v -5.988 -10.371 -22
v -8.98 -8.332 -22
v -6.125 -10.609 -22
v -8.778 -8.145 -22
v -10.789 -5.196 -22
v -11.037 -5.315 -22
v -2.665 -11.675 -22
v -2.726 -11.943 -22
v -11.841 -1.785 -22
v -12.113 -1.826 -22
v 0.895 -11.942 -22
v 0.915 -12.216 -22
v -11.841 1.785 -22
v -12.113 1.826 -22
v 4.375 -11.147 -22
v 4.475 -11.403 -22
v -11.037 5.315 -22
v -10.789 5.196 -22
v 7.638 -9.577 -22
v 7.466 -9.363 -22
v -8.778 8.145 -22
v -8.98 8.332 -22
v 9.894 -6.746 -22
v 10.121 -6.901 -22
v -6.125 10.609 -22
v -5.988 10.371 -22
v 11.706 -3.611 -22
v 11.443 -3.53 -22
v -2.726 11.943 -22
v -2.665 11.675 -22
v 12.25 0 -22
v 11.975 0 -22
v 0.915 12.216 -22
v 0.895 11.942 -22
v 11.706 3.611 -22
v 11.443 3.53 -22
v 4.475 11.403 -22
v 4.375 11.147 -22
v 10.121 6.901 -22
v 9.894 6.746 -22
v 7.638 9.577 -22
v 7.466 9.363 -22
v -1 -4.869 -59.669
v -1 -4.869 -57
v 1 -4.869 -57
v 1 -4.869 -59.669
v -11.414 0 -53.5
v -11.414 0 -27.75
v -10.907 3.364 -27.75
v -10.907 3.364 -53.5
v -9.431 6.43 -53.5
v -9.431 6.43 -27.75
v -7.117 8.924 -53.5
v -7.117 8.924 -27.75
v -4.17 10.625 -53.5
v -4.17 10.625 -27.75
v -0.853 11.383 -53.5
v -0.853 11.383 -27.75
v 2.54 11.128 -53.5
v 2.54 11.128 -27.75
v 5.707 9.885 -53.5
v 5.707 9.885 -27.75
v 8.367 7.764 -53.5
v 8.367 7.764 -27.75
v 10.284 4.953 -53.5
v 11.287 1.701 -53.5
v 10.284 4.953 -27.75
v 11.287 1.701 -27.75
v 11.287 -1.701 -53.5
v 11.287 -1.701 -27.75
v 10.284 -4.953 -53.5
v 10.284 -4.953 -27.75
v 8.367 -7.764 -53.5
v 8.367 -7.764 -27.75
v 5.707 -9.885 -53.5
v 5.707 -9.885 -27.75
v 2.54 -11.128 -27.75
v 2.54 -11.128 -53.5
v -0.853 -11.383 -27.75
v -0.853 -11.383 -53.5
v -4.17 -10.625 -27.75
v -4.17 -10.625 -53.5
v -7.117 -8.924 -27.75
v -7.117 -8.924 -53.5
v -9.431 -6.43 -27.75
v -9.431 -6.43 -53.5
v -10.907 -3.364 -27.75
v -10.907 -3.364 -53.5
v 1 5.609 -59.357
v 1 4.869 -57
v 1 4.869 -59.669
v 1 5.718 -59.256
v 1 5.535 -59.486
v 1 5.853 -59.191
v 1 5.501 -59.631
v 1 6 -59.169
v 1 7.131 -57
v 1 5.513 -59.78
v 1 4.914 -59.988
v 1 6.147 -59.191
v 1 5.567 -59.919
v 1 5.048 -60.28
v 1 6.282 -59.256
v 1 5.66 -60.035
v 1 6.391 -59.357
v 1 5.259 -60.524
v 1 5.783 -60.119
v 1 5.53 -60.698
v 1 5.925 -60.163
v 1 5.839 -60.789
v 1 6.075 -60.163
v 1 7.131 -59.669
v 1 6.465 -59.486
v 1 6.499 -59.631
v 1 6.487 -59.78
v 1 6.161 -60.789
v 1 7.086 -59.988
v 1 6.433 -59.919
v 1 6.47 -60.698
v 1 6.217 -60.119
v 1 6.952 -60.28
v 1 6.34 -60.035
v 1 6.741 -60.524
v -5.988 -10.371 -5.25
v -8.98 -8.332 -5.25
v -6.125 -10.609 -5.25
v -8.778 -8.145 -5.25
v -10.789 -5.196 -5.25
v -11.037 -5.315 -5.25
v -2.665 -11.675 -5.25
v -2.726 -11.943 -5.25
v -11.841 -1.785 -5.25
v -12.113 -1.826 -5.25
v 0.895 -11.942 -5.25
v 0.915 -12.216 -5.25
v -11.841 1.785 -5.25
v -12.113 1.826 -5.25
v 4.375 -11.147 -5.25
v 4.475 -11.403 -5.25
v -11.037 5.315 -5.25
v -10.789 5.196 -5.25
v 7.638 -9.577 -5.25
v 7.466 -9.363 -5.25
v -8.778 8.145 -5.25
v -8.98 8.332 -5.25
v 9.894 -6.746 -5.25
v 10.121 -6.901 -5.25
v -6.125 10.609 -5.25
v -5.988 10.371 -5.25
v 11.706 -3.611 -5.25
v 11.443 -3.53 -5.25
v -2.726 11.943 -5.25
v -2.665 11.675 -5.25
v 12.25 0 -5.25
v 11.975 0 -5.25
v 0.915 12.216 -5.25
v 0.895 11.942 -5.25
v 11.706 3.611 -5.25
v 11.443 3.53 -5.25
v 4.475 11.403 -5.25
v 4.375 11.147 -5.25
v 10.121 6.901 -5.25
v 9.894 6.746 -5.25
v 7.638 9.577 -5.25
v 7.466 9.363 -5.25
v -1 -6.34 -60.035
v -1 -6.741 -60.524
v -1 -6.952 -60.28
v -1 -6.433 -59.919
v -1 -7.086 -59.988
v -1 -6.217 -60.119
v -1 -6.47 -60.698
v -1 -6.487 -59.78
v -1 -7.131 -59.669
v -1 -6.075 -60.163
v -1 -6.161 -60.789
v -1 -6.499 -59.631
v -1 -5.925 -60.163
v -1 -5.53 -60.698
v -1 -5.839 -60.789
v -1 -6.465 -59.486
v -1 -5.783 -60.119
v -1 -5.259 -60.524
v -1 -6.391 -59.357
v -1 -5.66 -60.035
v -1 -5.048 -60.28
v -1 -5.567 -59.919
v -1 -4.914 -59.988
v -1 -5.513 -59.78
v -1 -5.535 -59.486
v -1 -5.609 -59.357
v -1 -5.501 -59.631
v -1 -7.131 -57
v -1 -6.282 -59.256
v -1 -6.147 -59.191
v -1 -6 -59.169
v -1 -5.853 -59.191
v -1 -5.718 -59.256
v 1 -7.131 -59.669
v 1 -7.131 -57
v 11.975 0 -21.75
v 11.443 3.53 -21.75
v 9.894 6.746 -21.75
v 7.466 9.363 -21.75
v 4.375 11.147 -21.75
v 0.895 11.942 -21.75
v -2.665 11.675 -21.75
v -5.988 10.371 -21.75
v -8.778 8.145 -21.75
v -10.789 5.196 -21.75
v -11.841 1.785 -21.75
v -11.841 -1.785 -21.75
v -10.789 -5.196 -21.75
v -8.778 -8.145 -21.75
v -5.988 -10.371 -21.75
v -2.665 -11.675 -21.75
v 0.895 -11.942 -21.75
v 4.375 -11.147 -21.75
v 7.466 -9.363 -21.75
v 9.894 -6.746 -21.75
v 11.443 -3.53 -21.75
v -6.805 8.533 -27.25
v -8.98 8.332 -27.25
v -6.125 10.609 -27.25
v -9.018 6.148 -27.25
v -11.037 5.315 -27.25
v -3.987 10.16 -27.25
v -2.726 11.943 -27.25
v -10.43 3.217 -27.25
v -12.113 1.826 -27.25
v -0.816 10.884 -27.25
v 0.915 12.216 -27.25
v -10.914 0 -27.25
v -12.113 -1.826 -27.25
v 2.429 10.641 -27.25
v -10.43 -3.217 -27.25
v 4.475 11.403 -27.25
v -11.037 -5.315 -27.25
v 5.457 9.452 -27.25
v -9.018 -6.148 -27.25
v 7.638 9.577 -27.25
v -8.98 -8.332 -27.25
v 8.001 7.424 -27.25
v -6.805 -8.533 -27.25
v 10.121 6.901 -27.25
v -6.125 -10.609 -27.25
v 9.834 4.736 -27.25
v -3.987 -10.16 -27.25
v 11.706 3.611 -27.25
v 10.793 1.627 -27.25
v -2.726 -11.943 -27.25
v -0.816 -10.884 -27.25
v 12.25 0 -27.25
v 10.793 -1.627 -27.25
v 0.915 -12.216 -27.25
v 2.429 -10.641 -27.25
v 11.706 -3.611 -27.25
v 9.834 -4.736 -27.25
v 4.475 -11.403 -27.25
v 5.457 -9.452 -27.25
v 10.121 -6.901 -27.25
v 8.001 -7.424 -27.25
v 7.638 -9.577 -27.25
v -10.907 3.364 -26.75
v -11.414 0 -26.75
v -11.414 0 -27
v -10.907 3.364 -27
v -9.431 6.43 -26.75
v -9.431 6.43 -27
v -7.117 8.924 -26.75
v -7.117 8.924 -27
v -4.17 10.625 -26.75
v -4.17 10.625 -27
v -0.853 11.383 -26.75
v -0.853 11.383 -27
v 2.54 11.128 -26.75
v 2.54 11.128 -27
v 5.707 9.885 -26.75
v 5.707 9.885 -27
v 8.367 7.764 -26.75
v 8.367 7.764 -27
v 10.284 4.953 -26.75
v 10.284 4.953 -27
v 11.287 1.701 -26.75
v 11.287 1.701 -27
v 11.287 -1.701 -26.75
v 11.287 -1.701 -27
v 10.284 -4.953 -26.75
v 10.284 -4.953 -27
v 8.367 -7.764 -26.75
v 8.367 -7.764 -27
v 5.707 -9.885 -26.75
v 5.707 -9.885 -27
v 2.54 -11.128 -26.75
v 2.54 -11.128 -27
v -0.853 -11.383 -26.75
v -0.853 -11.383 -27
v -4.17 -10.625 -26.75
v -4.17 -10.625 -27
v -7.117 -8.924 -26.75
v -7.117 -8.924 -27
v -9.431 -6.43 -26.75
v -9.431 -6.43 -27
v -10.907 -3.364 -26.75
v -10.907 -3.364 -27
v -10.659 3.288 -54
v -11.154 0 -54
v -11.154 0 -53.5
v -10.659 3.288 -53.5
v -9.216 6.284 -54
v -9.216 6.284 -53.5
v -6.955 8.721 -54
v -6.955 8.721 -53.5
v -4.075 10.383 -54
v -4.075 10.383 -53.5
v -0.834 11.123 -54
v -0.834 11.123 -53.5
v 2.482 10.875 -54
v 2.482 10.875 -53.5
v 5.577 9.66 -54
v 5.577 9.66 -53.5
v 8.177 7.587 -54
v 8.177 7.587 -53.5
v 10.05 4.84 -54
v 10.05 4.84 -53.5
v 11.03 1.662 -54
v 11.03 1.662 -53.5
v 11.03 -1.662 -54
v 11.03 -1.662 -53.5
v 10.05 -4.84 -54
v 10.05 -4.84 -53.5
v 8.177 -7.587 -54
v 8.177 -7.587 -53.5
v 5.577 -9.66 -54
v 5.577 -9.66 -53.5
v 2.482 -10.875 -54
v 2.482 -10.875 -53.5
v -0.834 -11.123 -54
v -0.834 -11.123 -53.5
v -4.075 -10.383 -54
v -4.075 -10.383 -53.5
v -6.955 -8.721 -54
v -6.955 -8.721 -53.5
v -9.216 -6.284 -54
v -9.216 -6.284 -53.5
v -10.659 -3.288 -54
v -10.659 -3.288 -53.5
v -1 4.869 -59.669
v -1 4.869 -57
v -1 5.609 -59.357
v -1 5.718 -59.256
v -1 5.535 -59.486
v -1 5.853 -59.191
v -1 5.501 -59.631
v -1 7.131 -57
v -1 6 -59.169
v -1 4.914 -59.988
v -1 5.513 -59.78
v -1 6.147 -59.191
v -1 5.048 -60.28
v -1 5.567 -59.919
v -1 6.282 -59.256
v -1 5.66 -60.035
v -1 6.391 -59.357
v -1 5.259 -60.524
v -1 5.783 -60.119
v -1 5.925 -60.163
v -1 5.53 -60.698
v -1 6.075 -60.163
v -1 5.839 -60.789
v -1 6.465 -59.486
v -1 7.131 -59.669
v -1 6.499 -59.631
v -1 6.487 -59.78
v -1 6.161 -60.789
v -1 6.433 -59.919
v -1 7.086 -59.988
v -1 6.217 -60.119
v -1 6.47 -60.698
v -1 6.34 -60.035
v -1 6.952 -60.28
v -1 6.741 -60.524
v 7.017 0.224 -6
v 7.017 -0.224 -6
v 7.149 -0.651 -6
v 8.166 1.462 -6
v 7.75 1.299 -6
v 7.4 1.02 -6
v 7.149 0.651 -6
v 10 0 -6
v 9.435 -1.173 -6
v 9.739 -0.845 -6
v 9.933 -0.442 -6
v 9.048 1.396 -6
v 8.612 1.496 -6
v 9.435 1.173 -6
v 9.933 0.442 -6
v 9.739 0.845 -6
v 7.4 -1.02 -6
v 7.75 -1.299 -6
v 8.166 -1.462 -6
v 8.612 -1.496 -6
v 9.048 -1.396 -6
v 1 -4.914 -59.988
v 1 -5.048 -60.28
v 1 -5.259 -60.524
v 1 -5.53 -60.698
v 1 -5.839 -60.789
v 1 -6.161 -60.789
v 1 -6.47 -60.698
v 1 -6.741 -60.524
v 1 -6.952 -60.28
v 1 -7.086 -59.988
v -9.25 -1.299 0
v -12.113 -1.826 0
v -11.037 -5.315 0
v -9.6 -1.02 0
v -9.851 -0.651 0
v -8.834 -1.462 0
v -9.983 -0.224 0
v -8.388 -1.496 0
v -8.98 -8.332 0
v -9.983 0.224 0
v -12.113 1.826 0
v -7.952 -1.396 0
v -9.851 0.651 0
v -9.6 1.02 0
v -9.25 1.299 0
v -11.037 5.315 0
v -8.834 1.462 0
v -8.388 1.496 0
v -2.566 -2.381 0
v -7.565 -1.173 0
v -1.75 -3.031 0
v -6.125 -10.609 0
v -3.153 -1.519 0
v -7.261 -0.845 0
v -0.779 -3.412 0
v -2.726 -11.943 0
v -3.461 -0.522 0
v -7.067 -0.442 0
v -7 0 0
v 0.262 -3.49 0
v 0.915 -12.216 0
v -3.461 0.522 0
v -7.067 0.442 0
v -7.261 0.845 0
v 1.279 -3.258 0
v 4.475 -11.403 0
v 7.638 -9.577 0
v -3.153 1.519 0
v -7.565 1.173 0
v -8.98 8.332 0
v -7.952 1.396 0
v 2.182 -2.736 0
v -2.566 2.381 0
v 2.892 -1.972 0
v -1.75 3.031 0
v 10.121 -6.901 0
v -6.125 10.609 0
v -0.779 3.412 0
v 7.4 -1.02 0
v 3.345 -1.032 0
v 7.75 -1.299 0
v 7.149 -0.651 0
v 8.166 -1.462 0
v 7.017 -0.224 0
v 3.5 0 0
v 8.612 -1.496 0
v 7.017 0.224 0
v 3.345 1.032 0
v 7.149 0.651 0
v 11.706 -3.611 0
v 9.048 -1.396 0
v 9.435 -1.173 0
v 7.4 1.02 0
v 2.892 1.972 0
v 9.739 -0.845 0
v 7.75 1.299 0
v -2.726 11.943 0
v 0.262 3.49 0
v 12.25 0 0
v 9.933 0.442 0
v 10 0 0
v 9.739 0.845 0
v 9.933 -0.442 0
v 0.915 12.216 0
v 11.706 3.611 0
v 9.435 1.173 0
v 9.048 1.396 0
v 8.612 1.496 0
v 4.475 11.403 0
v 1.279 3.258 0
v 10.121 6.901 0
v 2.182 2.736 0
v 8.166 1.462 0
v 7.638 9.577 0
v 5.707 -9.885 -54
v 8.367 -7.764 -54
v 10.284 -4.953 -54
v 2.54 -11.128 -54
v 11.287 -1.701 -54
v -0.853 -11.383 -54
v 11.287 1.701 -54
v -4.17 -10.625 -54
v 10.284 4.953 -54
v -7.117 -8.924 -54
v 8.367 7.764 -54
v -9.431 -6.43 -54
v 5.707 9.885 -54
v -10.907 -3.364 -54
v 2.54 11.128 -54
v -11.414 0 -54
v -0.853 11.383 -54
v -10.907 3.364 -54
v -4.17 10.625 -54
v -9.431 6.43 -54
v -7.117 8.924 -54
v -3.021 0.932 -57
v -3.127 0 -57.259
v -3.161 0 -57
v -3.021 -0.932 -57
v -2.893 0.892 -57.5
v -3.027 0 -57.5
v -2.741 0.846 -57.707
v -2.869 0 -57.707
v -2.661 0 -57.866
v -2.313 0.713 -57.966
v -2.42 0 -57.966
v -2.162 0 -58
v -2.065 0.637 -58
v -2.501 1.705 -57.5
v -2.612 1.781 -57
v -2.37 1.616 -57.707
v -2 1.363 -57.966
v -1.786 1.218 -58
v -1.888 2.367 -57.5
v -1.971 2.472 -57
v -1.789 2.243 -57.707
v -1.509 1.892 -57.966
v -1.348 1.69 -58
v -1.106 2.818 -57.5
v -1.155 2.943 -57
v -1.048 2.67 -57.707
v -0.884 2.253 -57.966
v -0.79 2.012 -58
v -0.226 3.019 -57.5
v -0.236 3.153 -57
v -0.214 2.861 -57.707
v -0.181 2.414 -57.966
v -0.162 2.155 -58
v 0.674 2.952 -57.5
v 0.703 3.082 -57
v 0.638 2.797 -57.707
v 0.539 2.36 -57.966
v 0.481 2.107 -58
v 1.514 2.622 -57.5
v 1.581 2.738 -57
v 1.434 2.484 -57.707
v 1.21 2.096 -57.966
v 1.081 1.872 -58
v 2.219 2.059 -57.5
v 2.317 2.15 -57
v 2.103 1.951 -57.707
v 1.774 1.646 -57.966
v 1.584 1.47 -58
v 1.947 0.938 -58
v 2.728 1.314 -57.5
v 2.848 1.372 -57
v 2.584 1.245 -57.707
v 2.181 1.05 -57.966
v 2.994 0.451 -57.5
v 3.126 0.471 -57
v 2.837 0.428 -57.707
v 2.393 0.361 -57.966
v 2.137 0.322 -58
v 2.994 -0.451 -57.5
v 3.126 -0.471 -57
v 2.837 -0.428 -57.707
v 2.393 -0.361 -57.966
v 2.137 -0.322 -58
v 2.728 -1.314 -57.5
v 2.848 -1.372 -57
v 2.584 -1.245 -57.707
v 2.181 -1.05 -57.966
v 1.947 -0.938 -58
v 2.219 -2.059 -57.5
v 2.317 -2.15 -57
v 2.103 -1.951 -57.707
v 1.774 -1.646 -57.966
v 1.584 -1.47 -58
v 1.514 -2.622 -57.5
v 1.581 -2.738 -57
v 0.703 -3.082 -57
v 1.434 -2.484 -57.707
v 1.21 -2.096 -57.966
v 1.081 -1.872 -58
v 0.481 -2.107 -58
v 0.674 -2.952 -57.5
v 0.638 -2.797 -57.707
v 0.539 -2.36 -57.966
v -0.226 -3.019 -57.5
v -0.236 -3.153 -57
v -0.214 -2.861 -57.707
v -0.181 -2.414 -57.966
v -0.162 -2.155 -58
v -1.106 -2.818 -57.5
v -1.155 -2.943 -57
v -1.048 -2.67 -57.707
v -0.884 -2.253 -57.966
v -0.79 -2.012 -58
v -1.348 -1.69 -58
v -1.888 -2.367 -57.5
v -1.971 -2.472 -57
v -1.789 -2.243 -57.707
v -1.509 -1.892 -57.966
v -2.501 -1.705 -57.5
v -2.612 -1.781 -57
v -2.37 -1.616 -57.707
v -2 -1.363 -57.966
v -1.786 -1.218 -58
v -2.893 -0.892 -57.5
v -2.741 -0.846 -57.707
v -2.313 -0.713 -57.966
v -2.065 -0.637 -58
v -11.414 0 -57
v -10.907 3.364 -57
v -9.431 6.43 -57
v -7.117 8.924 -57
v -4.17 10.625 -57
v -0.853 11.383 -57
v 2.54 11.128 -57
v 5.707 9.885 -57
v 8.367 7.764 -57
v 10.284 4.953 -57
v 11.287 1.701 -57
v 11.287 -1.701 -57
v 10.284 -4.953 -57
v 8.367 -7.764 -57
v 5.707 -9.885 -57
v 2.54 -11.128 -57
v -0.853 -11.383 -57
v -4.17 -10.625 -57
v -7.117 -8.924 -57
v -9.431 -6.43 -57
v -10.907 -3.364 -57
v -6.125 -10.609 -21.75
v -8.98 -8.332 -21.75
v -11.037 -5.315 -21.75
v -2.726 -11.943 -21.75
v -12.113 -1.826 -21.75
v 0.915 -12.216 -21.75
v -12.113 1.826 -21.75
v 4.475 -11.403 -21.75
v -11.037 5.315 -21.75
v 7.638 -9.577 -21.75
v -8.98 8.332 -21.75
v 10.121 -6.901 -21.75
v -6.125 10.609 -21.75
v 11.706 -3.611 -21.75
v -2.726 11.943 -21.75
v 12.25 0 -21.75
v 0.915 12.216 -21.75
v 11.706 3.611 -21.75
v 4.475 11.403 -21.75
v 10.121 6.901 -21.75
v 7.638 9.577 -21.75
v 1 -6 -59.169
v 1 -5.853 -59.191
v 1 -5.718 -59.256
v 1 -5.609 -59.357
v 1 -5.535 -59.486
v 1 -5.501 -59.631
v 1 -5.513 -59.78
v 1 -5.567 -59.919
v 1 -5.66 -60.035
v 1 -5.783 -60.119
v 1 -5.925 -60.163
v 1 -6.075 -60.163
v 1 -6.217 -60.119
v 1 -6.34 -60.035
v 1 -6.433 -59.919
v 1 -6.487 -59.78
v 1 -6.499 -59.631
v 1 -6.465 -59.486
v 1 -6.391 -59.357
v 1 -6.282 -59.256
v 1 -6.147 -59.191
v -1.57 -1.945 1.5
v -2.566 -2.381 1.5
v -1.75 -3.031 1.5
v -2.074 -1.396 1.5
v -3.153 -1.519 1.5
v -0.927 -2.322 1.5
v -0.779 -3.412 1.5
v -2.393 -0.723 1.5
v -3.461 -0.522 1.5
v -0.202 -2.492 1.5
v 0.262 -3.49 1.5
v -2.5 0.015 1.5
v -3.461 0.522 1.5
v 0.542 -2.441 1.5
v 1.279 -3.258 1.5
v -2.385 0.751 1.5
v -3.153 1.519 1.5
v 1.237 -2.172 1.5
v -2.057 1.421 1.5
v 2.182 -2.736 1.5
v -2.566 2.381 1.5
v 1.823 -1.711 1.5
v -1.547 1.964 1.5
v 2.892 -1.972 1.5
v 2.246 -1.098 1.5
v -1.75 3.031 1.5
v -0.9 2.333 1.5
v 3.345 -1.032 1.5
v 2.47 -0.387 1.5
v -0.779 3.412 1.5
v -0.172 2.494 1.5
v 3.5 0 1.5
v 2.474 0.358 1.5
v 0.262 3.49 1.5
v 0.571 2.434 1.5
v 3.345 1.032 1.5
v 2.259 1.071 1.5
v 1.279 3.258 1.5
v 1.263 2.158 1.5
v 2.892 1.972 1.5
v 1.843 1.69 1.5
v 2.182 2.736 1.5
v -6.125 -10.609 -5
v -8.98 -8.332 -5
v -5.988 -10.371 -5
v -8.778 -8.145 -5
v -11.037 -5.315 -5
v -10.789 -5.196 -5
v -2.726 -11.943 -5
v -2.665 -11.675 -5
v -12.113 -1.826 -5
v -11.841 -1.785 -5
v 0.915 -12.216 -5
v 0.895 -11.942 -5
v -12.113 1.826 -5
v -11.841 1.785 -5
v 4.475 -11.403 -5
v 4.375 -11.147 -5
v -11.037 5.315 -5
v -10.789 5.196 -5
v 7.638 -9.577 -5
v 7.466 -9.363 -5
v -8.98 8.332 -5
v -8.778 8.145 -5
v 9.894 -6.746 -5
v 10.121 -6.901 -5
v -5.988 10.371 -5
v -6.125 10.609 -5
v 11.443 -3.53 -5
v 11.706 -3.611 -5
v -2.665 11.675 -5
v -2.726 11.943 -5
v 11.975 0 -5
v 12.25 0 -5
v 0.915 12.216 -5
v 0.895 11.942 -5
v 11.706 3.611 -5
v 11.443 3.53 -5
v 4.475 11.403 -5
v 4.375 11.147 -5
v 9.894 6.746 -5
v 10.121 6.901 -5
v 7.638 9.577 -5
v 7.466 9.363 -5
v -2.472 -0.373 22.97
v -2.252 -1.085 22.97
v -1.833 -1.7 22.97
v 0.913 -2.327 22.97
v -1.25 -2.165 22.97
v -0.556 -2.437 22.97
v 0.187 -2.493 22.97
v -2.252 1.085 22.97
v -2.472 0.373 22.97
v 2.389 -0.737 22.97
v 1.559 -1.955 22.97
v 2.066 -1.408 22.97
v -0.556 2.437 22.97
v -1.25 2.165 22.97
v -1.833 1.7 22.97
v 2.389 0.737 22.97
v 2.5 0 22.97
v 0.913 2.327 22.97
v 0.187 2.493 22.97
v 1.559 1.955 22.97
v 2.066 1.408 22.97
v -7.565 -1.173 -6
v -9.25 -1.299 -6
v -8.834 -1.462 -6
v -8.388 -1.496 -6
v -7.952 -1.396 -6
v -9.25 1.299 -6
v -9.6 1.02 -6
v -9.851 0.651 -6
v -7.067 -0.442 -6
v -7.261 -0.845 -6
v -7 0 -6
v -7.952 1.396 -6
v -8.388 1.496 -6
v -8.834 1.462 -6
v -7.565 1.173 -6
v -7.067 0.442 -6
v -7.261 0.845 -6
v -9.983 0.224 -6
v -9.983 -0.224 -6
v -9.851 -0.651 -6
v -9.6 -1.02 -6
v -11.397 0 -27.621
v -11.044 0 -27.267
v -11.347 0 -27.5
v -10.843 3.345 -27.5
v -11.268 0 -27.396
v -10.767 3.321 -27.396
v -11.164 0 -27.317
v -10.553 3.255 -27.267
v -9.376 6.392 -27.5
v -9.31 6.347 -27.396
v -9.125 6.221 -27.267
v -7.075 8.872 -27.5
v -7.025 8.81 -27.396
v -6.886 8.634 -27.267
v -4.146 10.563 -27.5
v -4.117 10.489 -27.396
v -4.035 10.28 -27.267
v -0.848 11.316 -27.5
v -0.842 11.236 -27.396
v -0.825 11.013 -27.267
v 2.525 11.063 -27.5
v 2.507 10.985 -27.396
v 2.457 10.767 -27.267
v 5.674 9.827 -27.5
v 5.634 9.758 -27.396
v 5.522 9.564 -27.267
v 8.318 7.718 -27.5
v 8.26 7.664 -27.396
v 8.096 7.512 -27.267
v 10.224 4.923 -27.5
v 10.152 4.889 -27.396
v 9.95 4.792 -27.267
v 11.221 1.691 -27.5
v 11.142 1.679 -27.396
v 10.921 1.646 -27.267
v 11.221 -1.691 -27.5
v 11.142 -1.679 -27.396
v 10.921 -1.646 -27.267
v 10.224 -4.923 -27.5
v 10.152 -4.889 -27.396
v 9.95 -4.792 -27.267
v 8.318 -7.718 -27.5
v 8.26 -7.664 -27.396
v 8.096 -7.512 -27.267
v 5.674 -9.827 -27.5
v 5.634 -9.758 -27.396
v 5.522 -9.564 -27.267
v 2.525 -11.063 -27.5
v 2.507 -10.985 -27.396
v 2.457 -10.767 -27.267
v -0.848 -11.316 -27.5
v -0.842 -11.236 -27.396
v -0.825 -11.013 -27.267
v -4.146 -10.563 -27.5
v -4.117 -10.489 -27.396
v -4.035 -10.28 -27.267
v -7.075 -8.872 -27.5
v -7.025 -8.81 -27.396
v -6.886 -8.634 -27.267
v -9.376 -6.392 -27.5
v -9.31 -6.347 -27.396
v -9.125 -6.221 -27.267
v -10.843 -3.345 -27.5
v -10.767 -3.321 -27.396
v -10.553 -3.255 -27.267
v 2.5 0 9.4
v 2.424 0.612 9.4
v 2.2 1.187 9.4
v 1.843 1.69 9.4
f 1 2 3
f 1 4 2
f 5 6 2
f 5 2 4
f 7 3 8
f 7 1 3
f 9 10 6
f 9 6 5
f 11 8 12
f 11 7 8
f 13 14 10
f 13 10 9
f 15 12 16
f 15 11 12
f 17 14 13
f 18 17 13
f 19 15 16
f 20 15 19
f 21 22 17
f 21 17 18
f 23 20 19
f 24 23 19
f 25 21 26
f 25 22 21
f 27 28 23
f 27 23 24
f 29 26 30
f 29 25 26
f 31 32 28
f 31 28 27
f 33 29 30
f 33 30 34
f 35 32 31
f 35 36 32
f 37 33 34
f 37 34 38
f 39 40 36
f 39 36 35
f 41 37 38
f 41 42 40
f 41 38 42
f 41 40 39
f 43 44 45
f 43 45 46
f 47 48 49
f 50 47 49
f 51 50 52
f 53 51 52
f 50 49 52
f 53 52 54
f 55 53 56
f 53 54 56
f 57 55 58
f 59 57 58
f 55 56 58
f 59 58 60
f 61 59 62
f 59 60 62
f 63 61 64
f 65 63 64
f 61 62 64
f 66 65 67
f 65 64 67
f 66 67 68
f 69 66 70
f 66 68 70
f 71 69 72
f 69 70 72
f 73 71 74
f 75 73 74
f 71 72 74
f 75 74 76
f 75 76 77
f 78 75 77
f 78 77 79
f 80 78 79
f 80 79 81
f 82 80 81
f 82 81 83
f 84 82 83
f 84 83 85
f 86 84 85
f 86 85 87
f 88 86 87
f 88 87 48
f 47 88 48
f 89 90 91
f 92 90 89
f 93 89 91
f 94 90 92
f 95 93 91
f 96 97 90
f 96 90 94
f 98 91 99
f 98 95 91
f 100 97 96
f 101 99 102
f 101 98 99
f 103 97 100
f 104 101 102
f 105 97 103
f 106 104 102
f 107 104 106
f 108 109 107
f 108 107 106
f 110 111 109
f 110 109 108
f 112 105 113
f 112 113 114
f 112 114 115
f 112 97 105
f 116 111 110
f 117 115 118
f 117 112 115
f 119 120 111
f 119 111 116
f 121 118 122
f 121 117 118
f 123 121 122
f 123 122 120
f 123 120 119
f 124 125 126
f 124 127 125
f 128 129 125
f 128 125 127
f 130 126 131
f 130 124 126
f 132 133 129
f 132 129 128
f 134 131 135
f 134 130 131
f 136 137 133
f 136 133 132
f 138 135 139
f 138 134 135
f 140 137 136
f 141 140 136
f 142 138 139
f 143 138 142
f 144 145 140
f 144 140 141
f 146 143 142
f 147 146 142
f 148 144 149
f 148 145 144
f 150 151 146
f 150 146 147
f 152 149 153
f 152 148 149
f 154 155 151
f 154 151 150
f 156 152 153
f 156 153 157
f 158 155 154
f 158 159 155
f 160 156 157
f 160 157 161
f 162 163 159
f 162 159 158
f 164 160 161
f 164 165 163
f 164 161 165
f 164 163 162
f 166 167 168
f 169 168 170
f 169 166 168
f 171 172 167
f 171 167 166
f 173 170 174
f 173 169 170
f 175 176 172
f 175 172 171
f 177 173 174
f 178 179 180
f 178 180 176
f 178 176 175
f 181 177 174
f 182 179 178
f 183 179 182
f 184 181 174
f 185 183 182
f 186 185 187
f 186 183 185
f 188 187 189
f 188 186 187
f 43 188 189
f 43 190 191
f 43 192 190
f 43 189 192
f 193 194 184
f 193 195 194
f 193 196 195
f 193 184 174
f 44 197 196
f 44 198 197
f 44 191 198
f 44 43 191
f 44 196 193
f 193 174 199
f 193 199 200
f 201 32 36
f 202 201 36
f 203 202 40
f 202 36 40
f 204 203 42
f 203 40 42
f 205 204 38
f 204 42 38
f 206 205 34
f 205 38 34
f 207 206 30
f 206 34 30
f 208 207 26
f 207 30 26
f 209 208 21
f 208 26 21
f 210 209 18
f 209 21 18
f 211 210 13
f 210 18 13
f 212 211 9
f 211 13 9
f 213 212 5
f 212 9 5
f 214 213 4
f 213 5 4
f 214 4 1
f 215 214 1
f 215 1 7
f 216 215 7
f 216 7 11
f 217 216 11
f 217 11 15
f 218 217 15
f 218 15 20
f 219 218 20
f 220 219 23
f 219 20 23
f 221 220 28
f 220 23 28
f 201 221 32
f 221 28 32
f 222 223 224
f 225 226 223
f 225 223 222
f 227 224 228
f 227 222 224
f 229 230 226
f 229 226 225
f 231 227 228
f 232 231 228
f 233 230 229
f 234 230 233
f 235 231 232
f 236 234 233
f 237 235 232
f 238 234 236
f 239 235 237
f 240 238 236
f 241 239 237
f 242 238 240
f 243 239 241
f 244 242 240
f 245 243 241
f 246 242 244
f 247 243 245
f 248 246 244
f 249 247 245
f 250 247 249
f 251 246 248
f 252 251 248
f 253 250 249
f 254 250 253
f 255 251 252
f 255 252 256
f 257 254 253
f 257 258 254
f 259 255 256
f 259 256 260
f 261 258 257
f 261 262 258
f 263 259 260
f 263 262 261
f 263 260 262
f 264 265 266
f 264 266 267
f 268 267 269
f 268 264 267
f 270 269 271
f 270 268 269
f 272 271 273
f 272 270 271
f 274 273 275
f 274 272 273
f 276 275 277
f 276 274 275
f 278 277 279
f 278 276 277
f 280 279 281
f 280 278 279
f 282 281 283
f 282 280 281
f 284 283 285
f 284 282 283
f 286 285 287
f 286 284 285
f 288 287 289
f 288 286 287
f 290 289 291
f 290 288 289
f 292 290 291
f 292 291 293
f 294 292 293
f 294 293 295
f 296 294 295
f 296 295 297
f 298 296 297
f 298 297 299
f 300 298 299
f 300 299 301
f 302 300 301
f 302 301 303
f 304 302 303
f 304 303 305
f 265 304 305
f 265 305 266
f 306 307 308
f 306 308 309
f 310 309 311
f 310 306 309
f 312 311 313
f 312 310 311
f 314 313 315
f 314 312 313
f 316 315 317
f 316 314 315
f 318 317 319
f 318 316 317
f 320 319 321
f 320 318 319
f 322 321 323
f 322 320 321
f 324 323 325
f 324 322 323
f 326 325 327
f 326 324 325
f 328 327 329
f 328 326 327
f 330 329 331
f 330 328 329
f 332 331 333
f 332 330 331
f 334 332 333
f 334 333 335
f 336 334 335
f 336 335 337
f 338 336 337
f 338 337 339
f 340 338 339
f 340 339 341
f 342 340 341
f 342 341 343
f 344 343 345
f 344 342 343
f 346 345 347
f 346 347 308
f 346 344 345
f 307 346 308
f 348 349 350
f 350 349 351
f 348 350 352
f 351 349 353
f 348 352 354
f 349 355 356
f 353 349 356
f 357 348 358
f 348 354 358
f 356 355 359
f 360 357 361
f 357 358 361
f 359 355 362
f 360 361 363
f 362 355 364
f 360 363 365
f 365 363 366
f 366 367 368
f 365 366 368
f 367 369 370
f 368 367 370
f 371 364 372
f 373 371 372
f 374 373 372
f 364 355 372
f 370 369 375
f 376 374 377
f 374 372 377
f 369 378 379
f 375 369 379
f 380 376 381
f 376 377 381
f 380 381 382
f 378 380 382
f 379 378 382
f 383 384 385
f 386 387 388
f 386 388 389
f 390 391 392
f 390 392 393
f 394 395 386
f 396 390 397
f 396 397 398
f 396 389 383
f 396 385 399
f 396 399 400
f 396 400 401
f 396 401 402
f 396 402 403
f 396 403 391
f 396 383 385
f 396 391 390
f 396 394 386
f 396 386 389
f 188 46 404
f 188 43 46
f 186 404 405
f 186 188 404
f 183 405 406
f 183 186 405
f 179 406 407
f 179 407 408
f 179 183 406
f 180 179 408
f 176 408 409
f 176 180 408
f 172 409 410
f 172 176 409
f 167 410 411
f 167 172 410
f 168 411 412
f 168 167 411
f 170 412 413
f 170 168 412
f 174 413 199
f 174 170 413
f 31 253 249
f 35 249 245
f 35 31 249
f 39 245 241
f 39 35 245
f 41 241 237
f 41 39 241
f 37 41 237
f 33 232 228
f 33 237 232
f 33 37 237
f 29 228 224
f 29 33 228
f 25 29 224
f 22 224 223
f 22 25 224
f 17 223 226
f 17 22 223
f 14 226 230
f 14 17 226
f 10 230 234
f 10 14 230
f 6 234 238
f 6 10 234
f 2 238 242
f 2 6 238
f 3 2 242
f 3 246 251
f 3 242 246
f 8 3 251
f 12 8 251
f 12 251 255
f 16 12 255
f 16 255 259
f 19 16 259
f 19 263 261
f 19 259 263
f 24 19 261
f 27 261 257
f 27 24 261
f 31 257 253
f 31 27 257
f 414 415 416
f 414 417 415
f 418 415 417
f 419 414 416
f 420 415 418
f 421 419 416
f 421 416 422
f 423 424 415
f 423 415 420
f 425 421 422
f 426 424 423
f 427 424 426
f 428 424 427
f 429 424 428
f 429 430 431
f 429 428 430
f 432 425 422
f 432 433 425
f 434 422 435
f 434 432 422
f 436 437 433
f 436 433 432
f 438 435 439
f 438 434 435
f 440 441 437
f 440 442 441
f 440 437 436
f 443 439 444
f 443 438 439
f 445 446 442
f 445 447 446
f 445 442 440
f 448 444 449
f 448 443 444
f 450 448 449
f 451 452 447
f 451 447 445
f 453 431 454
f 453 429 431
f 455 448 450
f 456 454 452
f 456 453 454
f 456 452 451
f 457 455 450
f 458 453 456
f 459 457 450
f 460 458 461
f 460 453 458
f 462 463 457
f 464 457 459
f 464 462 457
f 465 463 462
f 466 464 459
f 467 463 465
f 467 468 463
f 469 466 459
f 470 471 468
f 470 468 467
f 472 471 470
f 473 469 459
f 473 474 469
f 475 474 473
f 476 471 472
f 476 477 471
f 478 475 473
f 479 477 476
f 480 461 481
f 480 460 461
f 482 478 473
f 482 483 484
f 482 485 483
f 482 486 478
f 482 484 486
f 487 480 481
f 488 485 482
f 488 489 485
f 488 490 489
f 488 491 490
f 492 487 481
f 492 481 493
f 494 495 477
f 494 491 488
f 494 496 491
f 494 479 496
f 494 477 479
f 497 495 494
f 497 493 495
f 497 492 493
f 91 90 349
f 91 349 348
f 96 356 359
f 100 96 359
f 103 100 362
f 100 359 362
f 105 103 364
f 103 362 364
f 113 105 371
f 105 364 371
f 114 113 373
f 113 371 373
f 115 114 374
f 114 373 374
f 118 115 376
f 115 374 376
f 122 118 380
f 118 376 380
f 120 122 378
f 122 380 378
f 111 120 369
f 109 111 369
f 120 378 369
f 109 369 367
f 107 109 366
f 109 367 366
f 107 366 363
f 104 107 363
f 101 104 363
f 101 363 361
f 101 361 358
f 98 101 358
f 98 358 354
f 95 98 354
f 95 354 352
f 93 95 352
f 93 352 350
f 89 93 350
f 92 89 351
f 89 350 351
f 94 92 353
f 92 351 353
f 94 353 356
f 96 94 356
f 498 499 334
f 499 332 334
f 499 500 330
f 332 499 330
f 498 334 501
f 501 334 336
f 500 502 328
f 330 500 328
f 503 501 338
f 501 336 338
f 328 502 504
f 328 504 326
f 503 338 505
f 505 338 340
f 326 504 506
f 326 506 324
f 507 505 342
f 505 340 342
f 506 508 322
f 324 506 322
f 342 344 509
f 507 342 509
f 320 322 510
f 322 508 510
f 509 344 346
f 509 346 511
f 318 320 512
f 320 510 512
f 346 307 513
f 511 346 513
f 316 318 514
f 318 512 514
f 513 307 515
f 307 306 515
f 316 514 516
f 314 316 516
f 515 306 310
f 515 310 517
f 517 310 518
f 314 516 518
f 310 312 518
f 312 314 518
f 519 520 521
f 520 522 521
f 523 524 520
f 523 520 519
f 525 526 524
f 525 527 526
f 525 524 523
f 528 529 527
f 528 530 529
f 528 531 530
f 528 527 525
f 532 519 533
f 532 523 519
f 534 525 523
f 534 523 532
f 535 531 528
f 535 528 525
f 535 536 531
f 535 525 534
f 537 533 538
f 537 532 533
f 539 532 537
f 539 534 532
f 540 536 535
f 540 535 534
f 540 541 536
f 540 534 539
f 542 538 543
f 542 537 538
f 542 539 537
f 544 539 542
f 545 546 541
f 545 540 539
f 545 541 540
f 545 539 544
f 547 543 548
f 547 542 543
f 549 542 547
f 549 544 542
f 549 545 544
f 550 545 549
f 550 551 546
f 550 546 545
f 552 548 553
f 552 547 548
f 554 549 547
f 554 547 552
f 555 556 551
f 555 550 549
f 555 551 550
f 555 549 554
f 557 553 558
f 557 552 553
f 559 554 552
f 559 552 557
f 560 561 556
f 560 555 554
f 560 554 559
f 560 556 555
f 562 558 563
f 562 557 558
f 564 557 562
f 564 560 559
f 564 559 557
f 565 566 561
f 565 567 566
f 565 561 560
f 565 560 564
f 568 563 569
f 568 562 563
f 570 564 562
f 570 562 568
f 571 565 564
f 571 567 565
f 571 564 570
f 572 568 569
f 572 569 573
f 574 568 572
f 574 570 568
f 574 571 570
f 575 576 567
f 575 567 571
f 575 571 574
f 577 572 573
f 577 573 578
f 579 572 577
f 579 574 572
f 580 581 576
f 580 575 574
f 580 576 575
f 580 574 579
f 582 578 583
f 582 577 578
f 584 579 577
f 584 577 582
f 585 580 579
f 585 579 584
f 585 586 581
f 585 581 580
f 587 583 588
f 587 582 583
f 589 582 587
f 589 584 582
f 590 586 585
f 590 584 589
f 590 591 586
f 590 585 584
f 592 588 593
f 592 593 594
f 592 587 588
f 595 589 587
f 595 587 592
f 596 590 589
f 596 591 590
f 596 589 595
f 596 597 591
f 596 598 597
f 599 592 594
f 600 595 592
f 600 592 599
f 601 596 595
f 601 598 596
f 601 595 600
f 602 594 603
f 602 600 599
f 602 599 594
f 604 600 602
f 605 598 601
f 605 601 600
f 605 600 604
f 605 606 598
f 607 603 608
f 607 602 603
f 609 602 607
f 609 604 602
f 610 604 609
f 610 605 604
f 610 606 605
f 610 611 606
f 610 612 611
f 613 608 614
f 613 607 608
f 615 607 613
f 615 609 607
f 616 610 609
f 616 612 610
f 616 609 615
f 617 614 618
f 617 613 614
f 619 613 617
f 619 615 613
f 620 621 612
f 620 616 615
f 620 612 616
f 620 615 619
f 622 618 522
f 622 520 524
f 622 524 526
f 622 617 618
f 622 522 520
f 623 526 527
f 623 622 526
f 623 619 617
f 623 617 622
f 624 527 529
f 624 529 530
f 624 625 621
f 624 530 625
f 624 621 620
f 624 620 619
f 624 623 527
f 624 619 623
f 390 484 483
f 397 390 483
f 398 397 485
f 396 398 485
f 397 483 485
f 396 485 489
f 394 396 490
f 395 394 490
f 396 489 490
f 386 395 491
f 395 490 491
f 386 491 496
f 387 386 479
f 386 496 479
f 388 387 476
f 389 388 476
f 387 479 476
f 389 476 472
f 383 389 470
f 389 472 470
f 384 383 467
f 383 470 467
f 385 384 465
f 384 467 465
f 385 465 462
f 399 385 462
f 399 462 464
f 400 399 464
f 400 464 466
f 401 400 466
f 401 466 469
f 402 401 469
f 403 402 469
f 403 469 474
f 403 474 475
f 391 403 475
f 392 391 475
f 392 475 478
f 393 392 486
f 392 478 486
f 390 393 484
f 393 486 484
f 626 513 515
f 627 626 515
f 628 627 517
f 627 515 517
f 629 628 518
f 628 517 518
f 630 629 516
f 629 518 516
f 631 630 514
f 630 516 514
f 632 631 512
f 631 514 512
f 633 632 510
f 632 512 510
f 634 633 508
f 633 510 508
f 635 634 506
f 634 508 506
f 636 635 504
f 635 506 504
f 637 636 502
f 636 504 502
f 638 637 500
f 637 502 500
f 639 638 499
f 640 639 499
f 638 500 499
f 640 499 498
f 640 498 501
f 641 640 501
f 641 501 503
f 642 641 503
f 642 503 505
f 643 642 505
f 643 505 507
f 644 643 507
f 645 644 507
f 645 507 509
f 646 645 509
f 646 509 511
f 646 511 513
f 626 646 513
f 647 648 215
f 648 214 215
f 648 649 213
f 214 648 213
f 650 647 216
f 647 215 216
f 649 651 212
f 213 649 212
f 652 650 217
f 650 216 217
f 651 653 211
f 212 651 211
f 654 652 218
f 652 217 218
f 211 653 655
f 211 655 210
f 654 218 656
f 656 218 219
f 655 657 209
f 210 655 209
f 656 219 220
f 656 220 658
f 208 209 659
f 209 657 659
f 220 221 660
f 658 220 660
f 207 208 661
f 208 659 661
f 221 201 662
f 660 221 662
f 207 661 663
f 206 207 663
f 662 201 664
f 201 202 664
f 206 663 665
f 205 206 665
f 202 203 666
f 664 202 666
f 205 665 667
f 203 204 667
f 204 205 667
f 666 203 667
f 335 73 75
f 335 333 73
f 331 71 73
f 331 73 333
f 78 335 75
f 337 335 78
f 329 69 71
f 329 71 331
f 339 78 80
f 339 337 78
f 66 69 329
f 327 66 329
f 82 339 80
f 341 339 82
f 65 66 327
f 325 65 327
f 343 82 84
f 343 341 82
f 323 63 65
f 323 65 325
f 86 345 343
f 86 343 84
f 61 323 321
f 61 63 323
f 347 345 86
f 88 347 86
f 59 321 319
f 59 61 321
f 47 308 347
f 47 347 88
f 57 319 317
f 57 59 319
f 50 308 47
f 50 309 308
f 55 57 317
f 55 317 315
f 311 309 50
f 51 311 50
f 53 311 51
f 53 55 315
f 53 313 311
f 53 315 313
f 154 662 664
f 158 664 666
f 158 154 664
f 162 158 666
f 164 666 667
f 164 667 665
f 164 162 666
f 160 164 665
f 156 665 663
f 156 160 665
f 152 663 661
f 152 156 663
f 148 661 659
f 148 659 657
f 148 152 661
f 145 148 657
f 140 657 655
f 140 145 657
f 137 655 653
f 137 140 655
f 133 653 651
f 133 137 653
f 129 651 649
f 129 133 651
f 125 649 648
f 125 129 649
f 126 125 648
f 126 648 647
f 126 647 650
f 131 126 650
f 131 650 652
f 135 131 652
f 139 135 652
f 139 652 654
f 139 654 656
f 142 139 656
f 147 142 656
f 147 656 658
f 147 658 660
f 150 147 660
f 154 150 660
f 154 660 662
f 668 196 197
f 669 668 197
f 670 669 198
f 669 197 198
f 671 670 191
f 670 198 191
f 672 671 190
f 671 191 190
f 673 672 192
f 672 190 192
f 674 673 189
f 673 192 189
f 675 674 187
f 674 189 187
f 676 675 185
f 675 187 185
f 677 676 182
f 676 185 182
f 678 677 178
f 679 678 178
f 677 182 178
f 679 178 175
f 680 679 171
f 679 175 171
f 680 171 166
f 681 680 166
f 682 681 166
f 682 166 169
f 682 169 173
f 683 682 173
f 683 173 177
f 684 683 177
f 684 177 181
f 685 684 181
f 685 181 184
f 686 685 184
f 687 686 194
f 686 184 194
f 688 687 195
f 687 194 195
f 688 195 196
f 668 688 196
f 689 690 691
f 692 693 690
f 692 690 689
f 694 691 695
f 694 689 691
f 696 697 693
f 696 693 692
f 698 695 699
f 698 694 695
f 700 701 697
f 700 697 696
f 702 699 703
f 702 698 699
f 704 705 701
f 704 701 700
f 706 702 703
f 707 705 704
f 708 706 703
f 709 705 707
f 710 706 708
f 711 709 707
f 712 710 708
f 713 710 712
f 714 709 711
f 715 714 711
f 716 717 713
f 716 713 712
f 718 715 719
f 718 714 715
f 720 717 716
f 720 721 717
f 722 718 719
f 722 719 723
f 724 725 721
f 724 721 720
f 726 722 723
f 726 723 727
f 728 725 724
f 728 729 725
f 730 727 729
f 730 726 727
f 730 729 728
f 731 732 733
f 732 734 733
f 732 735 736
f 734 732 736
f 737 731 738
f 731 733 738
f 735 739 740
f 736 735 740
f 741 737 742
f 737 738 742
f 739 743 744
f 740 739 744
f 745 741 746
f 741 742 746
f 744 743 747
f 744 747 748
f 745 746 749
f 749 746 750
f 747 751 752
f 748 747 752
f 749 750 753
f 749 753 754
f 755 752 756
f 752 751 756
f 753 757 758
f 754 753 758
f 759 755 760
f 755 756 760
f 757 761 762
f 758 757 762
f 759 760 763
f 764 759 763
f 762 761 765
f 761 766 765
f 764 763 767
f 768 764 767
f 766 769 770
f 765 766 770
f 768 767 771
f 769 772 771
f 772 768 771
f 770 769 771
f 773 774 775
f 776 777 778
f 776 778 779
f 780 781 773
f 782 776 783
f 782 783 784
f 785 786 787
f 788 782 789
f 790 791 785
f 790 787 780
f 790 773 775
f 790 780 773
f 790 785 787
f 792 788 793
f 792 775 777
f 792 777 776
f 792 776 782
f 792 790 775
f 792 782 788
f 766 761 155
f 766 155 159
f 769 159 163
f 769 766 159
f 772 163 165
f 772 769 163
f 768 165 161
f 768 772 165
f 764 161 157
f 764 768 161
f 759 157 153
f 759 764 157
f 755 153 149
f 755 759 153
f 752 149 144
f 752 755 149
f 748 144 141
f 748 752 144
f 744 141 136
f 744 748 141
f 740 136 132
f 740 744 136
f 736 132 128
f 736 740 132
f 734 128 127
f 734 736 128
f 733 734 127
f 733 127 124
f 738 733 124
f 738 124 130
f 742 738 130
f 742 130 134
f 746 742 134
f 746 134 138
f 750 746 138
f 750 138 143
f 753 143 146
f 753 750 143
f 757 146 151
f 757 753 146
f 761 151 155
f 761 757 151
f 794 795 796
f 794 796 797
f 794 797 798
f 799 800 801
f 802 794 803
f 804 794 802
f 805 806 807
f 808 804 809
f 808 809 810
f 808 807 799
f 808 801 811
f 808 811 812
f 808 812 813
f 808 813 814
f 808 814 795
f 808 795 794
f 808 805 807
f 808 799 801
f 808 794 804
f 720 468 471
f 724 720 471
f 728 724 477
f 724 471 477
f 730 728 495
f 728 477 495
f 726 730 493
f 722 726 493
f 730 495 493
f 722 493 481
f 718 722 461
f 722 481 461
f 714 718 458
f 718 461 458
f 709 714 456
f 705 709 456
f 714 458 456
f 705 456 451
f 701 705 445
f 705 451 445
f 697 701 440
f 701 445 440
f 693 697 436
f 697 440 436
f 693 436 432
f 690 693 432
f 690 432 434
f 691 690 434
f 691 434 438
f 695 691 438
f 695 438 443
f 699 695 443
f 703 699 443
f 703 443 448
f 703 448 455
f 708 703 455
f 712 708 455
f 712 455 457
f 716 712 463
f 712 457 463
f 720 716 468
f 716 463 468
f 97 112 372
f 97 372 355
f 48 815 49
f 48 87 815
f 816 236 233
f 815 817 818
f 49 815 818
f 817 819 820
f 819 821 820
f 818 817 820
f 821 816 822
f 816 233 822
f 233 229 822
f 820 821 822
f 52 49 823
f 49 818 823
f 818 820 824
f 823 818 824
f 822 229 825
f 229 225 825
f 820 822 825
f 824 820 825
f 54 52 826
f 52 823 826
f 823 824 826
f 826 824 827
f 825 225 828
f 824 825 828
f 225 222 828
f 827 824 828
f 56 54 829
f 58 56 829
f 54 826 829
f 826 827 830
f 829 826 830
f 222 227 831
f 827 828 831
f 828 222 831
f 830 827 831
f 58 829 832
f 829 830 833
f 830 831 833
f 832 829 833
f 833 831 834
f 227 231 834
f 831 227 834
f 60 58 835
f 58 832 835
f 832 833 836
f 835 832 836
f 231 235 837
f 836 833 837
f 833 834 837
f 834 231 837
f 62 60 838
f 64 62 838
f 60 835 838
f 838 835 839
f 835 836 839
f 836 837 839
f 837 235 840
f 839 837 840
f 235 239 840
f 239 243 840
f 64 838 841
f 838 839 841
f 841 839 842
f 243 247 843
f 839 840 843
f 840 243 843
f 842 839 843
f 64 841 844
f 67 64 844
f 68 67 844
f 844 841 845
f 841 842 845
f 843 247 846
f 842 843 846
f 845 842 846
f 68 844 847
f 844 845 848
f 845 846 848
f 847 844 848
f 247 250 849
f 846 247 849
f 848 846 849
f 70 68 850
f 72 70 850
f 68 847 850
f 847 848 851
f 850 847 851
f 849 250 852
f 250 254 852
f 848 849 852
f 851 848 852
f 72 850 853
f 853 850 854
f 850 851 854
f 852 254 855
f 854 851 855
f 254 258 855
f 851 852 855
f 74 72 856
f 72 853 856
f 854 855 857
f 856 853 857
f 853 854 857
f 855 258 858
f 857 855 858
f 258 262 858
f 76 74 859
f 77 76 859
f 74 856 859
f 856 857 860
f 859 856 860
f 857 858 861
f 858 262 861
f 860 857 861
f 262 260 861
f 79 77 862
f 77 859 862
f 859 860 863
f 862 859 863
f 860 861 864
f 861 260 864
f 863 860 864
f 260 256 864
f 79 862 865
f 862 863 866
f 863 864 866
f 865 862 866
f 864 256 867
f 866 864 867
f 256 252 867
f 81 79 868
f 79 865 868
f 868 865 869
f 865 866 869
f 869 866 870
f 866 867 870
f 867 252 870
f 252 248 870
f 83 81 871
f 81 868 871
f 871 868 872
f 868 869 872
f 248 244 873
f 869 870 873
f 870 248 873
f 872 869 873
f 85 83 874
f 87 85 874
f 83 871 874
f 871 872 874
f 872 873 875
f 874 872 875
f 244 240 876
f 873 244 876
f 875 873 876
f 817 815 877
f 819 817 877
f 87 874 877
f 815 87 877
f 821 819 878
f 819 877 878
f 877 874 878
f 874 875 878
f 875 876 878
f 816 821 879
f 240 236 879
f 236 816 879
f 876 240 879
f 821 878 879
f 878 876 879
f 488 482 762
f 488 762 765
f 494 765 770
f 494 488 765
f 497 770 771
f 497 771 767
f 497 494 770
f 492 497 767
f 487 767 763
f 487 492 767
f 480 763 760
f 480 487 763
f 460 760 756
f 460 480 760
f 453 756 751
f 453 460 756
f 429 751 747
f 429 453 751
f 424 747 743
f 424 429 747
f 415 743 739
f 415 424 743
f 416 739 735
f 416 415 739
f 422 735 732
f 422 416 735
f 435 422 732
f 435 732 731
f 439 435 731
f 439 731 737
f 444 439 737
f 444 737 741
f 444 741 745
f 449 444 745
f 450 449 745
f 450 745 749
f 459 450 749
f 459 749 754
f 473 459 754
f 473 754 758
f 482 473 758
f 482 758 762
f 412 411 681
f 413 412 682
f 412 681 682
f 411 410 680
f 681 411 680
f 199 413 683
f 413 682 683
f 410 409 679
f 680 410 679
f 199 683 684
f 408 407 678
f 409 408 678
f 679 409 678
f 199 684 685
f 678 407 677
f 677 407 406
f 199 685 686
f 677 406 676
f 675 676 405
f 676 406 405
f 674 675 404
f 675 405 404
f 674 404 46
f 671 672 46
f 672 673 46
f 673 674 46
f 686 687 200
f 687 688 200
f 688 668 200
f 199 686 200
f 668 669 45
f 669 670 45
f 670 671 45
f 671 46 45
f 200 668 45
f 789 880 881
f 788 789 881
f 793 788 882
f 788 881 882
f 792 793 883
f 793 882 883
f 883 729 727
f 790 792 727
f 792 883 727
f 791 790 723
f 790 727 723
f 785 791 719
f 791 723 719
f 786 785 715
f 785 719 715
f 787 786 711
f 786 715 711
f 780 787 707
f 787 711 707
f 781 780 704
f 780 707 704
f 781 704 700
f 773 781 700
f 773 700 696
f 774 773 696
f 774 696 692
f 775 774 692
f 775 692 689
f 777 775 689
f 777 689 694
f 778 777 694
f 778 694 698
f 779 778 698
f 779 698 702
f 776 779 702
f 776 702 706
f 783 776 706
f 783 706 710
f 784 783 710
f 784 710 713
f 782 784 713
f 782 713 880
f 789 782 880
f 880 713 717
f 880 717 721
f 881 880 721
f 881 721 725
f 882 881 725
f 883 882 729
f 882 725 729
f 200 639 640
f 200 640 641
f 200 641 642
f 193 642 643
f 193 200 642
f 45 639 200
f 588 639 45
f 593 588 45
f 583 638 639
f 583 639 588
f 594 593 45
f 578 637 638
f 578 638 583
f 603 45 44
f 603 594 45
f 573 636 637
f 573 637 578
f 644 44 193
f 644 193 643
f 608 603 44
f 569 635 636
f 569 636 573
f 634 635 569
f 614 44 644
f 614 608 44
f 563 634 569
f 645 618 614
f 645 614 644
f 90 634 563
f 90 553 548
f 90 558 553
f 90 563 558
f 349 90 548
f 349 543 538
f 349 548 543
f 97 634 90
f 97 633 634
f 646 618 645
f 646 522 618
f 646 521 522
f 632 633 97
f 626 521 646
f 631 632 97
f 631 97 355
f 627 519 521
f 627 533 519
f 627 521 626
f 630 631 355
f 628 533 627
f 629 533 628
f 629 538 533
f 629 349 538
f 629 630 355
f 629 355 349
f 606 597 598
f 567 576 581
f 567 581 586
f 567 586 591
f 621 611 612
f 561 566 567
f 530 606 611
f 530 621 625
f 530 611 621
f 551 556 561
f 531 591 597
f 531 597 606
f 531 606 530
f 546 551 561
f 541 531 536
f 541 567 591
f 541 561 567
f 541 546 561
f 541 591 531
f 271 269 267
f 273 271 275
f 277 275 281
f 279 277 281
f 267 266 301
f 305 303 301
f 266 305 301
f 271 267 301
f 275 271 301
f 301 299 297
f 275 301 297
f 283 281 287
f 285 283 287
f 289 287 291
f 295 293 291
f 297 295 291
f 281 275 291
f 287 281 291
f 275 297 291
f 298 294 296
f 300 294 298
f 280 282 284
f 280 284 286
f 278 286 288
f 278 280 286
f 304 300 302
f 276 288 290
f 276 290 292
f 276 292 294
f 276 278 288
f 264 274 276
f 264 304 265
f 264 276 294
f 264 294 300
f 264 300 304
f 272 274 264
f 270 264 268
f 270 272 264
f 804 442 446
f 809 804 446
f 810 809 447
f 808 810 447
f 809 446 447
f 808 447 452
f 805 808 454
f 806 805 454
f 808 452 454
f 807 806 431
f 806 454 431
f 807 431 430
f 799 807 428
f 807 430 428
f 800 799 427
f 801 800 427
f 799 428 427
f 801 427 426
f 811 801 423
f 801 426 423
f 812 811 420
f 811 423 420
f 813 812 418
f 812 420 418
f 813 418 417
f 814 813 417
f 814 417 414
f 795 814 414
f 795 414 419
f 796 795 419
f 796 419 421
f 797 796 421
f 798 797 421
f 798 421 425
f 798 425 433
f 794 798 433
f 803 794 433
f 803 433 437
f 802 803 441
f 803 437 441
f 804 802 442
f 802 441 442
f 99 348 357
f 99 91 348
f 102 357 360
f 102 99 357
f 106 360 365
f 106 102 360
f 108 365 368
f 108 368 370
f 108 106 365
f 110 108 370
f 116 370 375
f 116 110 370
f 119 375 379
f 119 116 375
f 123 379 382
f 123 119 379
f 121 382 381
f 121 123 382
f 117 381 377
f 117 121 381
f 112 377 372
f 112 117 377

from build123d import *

# Parameters (mm, degrees)
SKETCH1_R           = 12.25
BOSS_EXTRUDE1_DEPTH = 27
SKETCH2_R           = 11.414448149
BOSS_EXTRUDE2_DEPTH = 30
SKETCH3_R           = 2.5
BOSS_EXTRUDE3_DEPTH = 9.4
BOSS_EXTRUDE4_DEPTH = 1
SKETCH5_R           = 0.5
CUT_EXTRUDE1_DEPTH  = 2
SKETCH6_R           = 3.5
BOSS_EXTRUDE5_DEPTH = 1.5
SKETCH7_R           = 3.161406384
BOSS_EXTRUDE6_DEPTH = 1
FILLET1_R           = 1
CUT_EXTRUDE2_START  = -8
CUT_EXTRUDE2_DEPTH  = 8
SKETCH9_R           = 1.5
CUT_EXTRUDE3_DEPTH  = 6
SKETCH10_R          = 12.25
SKETCH10_R_2        = 11.97520775
CUT_EXTRUDE4_DEPTH  = 0.25
CUT_EXTRUDE7_START  = -0.5
SKETCH11_R          = 11.414448149
CUT_EXTRUDE7_DEPTH  = 0.5
FILLET2_R           = 0.5
SKETCH12_R          = 12.25
BOSS_EXTRUDE7_DEPTH = 0.25
SKETCH13_R          = 11.414448149
SKETCH13_R_2        = 11.154427358
CUT_EXTRUDE8_DEPTH  = 0.5
SKETCH3_2_R         = 2.5
BOSS_EXTRUDE8_DEPTH = 22.969653899


with BuildPart() as part:
    # Sketch1 → Boss-Extrude1 (new body)
    with BuildSketch(Plane.XY):
        Circle(SKETCH1_R)
    extrude(amount=-BOSS_EXTRUDE1_DEPTH)

    # Sketch2 → Boss-Extrude2 (add)
    with BuildSketch(Plane(origin=(0, 0, -27), x_dir=(-1, 0, 0), z_dir=(0, 0, -1))):
        Circle(SKETCH2_R)
    extrude(amount=BOSS_EXTRUDE2_DEPTH)

    # Sketch3 → Boss-Extrude3 (add)
    with BuildSketch(Plane.XY):
        Circle(SKETCH3_R)
    extrude(amount=BOSS_EXTRUDE3_DEPTH)

    # Sketch4 → Boss-Extrude4 (add, symmetric)
    with BuildSketch(Plane(origin=(0, 0, 0), x_dir=(0, 0, -1), z_dir=(1, 0, 0))):
        with BuildLine():
            Line((59.668792543, -7.131394742), (55.656453017, -7.131394742))
            ThreePointArc((55.656453017, -7.131394742), (54.525058274, -6), (55.656453017, -4.868605258))
            Line((55.656453017, -4.868605258), (59.668792543, -4.868605258))
            ThreePointArc((59.668792543, -4.868605258), (60.800187285, -6), (59.668792543, -7.131394742))
        make_face()
        with BuildLine():
            Line((59.668792543, 7.131394742), (55.656453017, 7.131394742))
            ThreePointArc((55.656453017, 7.131394742), (54.525058274, 6), (55.656453017, 4.868605258))
            Line((55.656453017, 4.868605258), (59.668792543, 4.868605258))
            ThreePointArc((59.668792543, 4.868605258), (60.800187285, 6), (59.668792543, 7.131394742))
        make_face()
    extrude(amount=BOSS_EXTRUDE4_DEPTH, both=True)

    # Sketch5 → Cut-Extrude1 (cut)
    with BuildSketch(Plane.ZY.offset(1)):
        with Locations((-59.668792543, -6)):
            Circle(SKETCH5_R)
        with Locations((-59.668792543, 6)):
            Circle(SKETCH5_R)
    extrude(amount=-CUT_EXTRUDE1_DEPTH, mode=Mode.SUBTRACT)

    # Sketch6 → Boss-Extrude5 (add)
    with BuildSketch(Plane.XY):
        Circle(SKETCH6_R)
    extrude(amount=BOSS_EXTRUDE5_DEPTH)

    # Sketch7 → Boss-Extrude6 (add)
    with BuildSketch(Plane(origin=(0, 0, -57), x_dir=(-1, 0, 0), z_dir=(0, 0, -1))):
        Circle(SKETCH7_R)
    extrude(amount=BOSS_EXTRUDE6_DEPTH)

    # Fillet1
    fillet1_edges = [part.edges().sort_by_distance(p)[0] for p in [
        (3.161406384, 0, -58),
    ]]
    fillet(fillet1_edges, radius=FILLET1_R - 0.0001)  # a hair under: the kernel refuses the full size

    # Sketch8 → Cut-Extrude2 (cut)
    with BuildSketch(Plane.XY.offset(9.4).offset(CUT_EXTRUDE2_START)):
        with BuildLine():
            Line((-1.842673821, 1.689542302), (1.842673821, 1.689542302))
            ThreePointArc((1.842673821, 1.689542302), (0, 2.5), (-1.842673821, 1.689542302))
        make_face()
    extrude(amount=CUT_EXTRUDE2_DEPTH, mode=Mode.SUBTRACT)

    # Sketch9 → Cut-Extrude3 (cut)
    with BuildSketch(Plane.XY):
        with Locations((-8.5, 0)):
            Circle(SKETCH9_R)
        with Locations((8.5, 0)):
            Circle(SKETCH9_R)
    extrude(amount=-CUT_EXTRUDE3_DEPTH, mode=Mode.SUBTRACT)

    # Sketch10 → Cut-Extrude4 (cut)
    with BuildSketch(Plane.XY.offset(-5)):
        Circle(SKETCH10_R)
        Circle(SKETCH10_R_2, mode=Mode.SUBTRACT)
    cut_extrude4 = extrude(amount=-CUT_EXTRUDE4_DEPTH, mode=Mode.SUBTRACT)

    # Mirror1: Cut-Extrude4 across plane
    add(cut_extrude4.mirror(Plane.XY.offset(-13.5)), mode=Mode.SUBTRACT)

    # Sketch11 → Cut-Extrude7 (cut)
    with BuildSketch(Plane(origin=(0, 0, -27.25), x_dir=(-1, 0, 0), z_dir=(0, 0, -1)).offset(CUT_EXTRUDE7_START)):
        Circle(SKETCH11_R)
    extrude(amount=CUT_EXTRUDE7_DEPTH, mode=Mode.SUBTRACT)


with BuildPart() as cut_extrude7_piece_1:
    # of the separate pieces the step leaves, piece 1, a body of its own (cut_extrude7_pieces)
    add(part.part.solids().sort_by_distance((12.25, 0, -27))[0])



with BuildPart() as cut_extrude7_piece_2:
    # of the separate pieces the step leaves, piece 2, a body of its own (cut_extrude7_pieces)
    add(part.part.solids().sort_by_distance((-3.161406384, 0, -57.0001))[0])

    # Fillet2
    fillet2_edges = [cut_extrude7_piece_2.edges().sort_by_distance(p)[0] for p in [
        (11.414448149, 0, -27.25),
    ]]
    fillet(fillet2_edges, radius=FILLET2_R)


with BuildPart() as cut_extrude7_piece_1_1:
    add(cut_extrude7_piece_1.part)

    add(cut_extrude7_piece_2.part)  # Boss-Extrude7 merges Cut-Extrude7 piece 2
    # Sketch12 → Boss-Extrude7 (add)
    with BuildSketch(Plane(origin=(0, 0, -27), x_dir=(-1, 0, 0), z_dir=(0, 0, -1))):
        with Locations(Location((0, 0, 0), (0, 0, 180))):
            Circle(SKETCH12_R)
    extrude(amount=BOSS_EXTRUDE7_DEPTH)

    # Sketch13 → Cut-Extrude8 (cut)
    with BuildSketch(Plane(origin=(0, 0, -54), x_dir=(-1, 0, 0), z_dir=(0, 0, -1))):
        Circle(SKETCH13_R)
        Circle(SKETCH13_R_2, mode=Mode.SUBTRACT)
    extrude(amount=-CUT_EXTRUDE8_DEPTH, mode=Mode.SUBTRACT)

    # Sketch3<2> → Boss-Extrude8 (add)
    with BuildSketch(Plane.XY):
        Circle(SKETCH3_2_R)
    extrude(amount=BOSS_EXTRUDE8_DEPTH)


solid = cut_extrude7_piece_1_1.part
